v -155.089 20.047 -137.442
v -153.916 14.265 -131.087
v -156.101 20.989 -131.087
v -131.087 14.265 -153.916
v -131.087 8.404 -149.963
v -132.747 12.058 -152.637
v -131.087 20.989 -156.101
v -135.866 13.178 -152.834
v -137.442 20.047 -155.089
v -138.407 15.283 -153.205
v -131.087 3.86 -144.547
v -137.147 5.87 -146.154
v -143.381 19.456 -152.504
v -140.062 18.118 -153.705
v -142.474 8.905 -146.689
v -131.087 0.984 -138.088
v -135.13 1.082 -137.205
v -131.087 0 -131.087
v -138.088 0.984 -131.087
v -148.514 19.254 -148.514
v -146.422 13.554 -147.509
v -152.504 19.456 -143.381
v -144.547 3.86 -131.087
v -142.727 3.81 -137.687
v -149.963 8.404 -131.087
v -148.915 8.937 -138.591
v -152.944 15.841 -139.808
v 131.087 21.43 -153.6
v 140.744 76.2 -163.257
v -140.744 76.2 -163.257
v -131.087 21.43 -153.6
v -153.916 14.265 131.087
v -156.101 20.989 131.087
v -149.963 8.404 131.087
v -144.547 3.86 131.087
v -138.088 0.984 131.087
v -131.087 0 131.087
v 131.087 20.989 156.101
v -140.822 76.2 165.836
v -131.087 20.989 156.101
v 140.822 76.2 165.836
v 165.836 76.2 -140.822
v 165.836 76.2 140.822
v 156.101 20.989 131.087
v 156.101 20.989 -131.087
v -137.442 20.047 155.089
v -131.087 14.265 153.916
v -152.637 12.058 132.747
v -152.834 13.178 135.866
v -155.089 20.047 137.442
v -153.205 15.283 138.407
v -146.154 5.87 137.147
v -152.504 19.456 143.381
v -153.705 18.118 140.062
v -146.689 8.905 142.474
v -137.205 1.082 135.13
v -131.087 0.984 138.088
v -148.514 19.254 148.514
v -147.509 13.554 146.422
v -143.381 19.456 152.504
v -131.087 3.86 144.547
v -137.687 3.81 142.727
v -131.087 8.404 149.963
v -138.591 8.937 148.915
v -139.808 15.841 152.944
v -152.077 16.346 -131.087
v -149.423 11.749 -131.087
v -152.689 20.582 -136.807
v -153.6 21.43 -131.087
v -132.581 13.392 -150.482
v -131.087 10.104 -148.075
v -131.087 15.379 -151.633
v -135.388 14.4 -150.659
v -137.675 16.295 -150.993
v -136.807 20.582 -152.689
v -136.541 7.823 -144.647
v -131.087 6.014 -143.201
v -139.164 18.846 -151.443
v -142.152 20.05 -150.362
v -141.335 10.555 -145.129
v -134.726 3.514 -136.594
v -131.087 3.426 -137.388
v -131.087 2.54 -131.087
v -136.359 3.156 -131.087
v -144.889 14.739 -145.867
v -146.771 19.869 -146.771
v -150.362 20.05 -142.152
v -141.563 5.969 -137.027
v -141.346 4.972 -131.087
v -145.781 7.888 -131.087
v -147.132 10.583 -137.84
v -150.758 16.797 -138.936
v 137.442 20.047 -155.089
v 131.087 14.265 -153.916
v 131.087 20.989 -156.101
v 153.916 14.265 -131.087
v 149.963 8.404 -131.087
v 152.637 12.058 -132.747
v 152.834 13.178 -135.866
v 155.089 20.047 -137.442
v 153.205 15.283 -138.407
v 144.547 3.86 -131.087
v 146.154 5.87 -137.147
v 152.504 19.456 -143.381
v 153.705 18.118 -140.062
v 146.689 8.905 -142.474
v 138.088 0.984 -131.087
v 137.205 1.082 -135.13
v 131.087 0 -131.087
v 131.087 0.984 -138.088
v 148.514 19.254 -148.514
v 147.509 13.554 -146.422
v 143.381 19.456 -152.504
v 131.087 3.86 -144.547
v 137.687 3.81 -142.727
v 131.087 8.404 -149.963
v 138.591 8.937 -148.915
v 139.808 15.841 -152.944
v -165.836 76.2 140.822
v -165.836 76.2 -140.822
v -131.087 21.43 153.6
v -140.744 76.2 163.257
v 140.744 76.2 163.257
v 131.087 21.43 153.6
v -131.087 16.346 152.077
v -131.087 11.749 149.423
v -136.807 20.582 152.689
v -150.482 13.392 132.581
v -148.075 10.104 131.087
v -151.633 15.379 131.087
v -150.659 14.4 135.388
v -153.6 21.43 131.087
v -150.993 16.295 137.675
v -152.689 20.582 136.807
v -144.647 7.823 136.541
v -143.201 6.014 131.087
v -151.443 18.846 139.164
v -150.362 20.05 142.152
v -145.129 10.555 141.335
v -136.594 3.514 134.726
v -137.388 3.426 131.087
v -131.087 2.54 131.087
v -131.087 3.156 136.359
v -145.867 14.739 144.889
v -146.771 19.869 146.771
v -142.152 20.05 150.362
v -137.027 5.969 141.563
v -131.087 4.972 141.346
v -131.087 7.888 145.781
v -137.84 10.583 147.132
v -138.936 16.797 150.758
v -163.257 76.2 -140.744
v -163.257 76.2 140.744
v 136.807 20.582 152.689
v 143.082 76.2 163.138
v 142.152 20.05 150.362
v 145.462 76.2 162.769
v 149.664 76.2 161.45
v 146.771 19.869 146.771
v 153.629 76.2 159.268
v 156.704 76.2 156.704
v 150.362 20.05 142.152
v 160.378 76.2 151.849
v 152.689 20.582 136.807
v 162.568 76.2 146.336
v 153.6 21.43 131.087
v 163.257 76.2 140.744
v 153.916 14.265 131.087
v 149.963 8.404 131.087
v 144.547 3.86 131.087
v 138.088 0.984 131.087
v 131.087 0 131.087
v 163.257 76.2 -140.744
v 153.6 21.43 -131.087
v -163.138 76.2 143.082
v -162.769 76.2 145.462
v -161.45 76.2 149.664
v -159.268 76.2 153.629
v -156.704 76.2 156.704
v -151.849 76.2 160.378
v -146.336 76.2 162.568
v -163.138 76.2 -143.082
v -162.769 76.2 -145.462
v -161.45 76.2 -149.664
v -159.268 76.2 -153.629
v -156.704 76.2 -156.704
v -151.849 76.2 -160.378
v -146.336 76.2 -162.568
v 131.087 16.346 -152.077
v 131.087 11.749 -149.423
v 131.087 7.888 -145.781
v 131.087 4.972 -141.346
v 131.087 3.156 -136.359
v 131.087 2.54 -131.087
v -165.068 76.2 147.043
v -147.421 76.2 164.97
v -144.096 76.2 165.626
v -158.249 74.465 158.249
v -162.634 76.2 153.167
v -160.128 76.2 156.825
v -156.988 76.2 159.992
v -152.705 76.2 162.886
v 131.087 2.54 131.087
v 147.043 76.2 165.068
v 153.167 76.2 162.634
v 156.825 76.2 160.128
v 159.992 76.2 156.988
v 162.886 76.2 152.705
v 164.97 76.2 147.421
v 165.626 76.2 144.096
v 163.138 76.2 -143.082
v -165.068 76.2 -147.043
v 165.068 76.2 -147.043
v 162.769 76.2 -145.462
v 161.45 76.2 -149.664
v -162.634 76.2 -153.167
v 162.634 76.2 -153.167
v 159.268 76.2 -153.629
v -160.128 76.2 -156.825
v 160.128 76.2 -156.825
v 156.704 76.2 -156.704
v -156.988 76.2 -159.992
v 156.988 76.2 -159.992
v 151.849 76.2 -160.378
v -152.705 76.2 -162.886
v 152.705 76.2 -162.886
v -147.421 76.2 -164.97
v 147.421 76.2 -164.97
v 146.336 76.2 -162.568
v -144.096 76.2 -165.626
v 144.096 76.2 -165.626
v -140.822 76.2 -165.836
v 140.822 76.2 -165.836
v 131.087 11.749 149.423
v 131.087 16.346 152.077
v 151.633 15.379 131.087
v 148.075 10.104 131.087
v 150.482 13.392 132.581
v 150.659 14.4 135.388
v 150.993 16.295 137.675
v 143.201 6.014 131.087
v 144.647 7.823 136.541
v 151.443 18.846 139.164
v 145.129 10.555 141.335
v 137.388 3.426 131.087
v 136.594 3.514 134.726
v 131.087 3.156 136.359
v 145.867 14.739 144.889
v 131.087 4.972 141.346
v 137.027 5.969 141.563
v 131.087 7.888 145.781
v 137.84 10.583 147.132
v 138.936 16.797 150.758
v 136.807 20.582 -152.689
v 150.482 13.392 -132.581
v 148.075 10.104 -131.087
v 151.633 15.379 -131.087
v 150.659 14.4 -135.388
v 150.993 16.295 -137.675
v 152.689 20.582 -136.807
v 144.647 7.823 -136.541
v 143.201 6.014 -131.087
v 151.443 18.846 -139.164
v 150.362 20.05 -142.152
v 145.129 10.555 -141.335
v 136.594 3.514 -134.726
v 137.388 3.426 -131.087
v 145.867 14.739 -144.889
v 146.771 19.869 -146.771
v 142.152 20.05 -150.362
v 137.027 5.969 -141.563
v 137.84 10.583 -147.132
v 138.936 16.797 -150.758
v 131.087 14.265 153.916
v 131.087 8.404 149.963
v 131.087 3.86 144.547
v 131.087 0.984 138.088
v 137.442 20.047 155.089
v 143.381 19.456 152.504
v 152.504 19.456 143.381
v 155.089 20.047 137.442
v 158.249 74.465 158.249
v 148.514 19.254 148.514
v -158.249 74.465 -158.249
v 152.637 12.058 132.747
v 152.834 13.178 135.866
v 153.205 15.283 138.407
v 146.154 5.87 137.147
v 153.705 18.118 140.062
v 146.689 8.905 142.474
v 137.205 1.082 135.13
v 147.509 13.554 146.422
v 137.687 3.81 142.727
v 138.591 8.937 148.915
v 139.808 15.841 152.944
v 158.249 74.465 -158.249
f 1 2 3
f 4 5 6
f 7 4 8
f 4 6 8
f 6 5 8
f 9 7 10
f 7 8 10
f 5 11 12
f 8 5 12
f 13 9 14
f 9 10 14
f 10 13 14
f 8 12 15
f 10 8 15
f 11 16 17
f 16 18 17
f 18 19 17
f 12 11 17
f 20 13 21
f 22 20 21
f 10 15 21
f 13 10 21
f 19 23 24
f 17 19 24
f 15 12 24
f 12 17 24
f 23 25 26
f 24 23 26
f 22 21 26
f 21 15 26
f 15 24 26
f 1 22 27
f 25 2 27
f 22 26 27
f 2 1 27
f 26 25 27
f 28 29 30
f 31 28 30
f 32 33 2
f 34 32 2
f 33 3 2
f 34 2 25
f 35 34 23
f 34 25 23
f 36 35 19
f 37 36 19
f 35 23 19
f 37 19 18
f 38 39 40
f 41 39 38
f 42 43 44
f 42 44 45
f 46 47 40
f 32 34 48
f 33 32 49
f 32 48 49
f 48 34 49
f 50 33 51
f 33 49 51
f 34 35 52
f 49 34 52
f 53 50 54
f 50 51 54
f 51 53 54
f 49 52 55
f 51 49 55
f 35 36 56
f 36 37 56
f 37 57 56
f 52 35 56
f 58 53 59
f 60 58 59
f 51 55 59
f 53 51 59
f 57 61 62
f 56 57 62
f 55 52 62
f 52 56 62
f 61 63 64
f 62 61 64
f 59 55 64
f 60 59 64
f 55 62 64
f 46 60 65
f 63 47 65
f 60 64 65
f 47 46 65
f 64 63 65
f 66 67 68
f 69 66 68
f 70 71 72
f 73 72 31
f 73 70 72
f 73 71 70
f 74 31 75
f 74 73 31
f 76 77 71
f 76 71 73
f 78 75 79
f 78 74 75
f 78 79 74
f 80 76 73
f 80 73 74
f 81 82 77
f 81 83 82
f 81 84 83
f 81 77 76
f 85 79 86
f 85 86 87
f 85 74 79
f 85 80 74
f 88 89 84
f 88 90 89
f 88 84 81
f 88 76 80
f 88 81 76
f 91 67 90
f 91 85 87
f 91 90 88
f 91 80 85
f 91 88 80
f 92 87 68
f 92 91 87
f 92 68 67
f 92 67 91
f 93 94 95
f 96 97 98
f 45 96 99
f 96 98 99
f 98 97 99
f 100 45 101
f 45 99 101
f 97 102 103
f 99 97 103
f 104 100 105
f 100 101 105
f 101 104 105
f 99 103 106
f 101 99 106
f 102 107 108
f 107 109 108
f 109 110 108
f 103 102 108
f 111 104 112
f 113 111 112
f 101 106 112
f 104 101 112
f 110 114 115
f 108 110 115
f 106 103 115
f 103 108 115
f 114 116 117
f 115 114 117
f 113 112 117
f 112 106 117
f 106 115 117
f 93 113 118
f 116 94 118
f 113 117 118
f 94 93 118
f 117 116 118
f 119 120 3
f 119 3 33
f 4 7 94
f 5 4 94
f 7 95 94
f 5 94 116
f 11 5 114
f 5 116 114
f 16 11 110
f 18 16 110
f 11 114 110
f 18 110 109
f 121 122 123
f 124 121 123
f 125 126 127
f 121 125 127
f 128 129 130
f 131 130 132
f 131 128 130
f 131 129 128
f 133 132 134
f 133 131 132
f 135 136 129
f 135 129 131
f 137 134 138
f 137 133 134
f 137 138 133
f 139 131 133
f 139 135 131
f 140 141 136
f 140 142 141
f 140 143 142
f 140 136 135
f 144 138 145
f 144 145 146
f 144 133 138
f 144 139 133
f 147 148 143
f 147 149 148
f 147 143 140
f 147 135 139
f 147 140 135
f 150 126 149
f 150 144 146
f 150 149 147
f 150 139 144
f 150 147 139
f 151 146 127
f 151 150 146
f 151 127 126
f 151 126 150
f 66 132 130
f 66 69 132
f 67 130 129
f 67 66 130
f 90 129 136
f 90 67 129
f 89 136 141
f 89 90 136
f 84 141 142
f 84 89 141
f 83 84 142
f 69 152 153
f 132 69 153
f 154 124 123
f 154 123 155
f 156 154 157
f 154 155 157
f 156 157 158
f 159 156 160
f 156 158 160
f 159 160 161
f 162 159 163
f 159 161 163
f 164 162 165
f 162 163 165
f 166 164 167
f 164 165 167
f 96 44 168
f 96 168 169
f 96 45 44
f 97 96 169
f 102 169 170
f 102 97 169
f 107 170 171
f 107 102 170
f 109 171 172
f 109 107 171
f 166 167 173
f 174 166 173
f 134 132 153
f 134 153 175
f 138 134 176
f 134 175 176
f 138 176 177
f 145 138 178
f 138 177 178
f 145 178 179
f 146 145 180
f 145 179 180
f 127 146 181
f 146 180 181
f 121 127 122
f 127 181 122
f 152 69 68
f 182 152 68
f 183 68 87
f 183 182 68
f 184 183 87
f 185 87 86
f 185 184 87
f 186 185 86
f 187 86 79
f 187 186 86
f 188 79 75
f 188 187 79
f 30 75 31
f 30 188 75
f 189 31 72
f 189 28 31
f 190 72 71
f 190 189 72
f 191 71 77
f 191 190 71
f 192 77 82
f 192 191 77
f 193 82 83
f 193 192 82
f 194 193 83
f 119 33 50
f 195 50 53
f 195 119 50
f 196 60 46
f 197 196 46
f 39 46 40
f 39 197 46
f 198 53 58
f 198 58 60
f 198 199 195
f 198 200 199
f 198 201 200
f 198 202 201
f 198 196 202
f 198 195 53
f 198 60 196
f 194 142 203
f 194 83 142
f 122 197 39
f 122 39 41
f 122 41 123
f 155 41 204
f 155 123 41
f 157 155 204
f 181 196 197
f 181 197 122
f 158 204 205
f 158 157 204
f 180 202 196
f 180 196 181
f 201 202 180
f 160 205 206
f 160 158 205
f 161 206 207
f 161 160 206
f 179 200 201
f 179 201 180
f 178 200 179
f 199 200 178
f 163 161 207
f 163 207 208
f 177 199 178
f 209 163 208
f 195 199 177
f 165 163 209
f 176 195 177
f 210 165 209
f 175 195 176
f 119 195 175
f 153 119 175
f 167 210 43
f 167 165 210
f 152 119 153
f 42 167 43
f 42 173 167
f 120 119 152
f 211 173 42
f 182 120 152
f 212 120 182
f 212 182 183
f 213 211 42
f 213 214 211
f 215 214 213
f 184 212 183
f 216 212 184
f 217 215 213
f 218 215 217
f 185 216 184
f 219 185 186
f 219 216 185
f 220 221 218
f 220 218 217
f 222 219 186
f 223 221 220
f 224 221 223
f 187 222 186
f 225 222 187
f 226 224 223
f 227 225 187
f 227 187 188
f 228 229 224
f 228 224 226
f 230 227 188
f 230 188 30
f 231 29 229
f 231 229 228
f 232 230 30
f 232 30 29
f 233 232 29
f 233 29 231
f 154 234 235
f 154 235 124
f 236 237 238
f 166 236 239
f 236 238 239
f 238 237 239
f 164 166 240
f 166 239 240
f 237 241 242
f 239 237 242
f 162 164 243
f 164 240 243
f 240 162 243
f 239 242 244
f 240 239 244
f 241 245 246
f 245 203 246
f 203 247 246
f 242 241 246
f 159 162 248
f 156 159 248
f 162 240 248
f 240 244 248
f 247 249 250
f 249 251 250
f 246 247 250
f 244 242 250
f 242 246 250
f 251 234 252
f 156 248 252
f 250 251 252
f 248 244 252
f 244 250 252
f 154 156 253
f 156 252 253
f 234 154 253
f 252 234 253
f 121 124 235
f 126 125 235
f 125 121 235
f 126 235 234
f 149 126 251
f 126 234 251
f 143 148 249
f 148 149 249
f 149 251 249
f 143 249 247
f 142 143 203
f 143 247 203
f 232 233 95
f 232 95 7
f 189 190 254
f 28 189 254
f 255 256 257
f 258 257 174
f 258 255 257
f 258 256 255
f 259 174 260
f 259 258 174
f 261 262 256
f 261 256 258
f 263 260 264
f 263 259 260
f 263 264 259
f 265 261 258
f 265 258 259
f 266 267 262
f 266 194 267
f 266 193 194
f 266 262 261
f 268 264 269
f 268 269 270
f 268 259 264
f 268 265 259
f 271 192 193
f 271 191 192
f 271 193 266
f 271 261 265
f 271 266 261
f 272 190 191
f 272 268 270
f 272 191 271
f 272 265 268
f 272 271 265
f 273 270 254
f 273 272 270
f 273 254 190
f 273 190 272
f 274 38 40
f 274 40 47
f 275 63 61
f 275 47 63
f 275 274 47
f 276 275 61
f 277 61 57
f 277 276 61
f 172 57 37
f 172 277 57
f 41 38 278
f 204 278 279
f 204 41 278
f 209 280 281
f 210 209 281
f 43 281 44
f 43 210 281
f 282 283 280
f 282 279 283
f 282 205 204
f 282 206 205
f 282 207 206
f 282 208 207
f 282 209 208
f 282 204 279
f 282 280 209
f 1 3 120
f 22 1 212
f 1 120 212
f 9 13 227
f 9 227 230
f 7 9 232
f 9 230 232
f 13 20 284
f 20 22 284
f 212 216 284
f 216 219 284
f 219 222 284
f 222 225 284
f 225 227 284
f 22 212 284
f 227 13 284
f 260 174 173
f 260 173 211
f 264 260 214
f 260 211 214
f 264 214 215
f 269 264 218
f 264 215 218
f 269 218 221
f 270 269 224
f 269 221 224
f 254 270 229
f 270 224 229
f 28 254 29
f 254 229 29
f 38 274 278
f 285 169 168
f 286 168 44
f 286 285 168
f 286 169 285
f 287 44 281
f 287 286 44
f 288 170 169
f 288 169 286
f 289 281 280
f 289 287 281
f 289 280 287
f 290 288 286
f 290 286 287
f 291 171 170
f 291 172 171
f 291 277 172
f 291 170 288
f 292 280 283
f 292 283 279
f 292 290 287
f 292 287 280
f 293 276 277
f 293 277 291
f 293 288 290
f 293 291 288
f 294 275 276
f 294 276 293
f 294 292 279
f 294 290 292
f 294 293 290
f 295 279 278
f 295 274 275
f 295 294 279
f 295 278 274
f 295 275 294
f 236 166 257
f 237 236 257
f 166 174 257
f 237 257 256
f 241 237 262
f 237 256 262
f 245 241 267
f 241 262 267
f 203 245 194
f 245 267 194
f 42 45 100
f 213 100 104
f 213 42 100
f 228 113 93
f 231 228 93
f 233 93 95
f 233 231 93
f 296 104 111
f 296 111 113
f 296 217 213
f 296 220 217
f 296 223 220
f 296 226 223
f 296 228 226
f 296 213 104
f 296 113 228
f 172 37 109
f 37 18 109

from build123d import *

# Parameters (mm, degrees)
SKETCH1_W           = 304.8
SKETCH1_H           = 304.8
BOSS_EXTRUDE1_DEPTH = 76.2
BOSS_EXTRUDE1_TAPER = -10
FILLET2_R           = 25.4
SHELL1_T            = -2.54


with BuildPart() as part:
    # Sketch1 → Boss-Extrude1 (new body)
    with BuildSketch(Plane(origin=(0, 0, 0), x_dir=(1, 0, 0), z_dir=(0, 1, 0))):
        Rectangle(SKETCH1_W, SKETCH1_H)
    extrude(amount=BOSS_EXTRUDE1_DEPTH, taper=BOSS_EXTRUDE1_TAPER)

    # Fillet2
    fillet2_edges = [part.edges().sort_by_distance(p)[0] for p in [
        (0, 0, 152.4),
        (-152.4, 0, 0),
        (0, 0, -152.4),
        (152.4, 0, 0),
        (159.118057965, 38.1, 159.118057965),
        (-159.118057965, 38.1, 159.118057965),
        (-159.118057965, 38.1, -159.118057965),
        (159.118057965, 38.1, -159.118057965),
    ]]
    fillet(fillet2_edges, radius=FILLET2_R)

    # Shell1
    shell1_openings = [part.faces().sort_by_distance(p)[0] for p in [
        (0, 76.2, 0),
    ]]
    offset(amount=SHELL1_T, openings=shell1_openings, kind=Kind.INTERSECTION)


solid = part.part
